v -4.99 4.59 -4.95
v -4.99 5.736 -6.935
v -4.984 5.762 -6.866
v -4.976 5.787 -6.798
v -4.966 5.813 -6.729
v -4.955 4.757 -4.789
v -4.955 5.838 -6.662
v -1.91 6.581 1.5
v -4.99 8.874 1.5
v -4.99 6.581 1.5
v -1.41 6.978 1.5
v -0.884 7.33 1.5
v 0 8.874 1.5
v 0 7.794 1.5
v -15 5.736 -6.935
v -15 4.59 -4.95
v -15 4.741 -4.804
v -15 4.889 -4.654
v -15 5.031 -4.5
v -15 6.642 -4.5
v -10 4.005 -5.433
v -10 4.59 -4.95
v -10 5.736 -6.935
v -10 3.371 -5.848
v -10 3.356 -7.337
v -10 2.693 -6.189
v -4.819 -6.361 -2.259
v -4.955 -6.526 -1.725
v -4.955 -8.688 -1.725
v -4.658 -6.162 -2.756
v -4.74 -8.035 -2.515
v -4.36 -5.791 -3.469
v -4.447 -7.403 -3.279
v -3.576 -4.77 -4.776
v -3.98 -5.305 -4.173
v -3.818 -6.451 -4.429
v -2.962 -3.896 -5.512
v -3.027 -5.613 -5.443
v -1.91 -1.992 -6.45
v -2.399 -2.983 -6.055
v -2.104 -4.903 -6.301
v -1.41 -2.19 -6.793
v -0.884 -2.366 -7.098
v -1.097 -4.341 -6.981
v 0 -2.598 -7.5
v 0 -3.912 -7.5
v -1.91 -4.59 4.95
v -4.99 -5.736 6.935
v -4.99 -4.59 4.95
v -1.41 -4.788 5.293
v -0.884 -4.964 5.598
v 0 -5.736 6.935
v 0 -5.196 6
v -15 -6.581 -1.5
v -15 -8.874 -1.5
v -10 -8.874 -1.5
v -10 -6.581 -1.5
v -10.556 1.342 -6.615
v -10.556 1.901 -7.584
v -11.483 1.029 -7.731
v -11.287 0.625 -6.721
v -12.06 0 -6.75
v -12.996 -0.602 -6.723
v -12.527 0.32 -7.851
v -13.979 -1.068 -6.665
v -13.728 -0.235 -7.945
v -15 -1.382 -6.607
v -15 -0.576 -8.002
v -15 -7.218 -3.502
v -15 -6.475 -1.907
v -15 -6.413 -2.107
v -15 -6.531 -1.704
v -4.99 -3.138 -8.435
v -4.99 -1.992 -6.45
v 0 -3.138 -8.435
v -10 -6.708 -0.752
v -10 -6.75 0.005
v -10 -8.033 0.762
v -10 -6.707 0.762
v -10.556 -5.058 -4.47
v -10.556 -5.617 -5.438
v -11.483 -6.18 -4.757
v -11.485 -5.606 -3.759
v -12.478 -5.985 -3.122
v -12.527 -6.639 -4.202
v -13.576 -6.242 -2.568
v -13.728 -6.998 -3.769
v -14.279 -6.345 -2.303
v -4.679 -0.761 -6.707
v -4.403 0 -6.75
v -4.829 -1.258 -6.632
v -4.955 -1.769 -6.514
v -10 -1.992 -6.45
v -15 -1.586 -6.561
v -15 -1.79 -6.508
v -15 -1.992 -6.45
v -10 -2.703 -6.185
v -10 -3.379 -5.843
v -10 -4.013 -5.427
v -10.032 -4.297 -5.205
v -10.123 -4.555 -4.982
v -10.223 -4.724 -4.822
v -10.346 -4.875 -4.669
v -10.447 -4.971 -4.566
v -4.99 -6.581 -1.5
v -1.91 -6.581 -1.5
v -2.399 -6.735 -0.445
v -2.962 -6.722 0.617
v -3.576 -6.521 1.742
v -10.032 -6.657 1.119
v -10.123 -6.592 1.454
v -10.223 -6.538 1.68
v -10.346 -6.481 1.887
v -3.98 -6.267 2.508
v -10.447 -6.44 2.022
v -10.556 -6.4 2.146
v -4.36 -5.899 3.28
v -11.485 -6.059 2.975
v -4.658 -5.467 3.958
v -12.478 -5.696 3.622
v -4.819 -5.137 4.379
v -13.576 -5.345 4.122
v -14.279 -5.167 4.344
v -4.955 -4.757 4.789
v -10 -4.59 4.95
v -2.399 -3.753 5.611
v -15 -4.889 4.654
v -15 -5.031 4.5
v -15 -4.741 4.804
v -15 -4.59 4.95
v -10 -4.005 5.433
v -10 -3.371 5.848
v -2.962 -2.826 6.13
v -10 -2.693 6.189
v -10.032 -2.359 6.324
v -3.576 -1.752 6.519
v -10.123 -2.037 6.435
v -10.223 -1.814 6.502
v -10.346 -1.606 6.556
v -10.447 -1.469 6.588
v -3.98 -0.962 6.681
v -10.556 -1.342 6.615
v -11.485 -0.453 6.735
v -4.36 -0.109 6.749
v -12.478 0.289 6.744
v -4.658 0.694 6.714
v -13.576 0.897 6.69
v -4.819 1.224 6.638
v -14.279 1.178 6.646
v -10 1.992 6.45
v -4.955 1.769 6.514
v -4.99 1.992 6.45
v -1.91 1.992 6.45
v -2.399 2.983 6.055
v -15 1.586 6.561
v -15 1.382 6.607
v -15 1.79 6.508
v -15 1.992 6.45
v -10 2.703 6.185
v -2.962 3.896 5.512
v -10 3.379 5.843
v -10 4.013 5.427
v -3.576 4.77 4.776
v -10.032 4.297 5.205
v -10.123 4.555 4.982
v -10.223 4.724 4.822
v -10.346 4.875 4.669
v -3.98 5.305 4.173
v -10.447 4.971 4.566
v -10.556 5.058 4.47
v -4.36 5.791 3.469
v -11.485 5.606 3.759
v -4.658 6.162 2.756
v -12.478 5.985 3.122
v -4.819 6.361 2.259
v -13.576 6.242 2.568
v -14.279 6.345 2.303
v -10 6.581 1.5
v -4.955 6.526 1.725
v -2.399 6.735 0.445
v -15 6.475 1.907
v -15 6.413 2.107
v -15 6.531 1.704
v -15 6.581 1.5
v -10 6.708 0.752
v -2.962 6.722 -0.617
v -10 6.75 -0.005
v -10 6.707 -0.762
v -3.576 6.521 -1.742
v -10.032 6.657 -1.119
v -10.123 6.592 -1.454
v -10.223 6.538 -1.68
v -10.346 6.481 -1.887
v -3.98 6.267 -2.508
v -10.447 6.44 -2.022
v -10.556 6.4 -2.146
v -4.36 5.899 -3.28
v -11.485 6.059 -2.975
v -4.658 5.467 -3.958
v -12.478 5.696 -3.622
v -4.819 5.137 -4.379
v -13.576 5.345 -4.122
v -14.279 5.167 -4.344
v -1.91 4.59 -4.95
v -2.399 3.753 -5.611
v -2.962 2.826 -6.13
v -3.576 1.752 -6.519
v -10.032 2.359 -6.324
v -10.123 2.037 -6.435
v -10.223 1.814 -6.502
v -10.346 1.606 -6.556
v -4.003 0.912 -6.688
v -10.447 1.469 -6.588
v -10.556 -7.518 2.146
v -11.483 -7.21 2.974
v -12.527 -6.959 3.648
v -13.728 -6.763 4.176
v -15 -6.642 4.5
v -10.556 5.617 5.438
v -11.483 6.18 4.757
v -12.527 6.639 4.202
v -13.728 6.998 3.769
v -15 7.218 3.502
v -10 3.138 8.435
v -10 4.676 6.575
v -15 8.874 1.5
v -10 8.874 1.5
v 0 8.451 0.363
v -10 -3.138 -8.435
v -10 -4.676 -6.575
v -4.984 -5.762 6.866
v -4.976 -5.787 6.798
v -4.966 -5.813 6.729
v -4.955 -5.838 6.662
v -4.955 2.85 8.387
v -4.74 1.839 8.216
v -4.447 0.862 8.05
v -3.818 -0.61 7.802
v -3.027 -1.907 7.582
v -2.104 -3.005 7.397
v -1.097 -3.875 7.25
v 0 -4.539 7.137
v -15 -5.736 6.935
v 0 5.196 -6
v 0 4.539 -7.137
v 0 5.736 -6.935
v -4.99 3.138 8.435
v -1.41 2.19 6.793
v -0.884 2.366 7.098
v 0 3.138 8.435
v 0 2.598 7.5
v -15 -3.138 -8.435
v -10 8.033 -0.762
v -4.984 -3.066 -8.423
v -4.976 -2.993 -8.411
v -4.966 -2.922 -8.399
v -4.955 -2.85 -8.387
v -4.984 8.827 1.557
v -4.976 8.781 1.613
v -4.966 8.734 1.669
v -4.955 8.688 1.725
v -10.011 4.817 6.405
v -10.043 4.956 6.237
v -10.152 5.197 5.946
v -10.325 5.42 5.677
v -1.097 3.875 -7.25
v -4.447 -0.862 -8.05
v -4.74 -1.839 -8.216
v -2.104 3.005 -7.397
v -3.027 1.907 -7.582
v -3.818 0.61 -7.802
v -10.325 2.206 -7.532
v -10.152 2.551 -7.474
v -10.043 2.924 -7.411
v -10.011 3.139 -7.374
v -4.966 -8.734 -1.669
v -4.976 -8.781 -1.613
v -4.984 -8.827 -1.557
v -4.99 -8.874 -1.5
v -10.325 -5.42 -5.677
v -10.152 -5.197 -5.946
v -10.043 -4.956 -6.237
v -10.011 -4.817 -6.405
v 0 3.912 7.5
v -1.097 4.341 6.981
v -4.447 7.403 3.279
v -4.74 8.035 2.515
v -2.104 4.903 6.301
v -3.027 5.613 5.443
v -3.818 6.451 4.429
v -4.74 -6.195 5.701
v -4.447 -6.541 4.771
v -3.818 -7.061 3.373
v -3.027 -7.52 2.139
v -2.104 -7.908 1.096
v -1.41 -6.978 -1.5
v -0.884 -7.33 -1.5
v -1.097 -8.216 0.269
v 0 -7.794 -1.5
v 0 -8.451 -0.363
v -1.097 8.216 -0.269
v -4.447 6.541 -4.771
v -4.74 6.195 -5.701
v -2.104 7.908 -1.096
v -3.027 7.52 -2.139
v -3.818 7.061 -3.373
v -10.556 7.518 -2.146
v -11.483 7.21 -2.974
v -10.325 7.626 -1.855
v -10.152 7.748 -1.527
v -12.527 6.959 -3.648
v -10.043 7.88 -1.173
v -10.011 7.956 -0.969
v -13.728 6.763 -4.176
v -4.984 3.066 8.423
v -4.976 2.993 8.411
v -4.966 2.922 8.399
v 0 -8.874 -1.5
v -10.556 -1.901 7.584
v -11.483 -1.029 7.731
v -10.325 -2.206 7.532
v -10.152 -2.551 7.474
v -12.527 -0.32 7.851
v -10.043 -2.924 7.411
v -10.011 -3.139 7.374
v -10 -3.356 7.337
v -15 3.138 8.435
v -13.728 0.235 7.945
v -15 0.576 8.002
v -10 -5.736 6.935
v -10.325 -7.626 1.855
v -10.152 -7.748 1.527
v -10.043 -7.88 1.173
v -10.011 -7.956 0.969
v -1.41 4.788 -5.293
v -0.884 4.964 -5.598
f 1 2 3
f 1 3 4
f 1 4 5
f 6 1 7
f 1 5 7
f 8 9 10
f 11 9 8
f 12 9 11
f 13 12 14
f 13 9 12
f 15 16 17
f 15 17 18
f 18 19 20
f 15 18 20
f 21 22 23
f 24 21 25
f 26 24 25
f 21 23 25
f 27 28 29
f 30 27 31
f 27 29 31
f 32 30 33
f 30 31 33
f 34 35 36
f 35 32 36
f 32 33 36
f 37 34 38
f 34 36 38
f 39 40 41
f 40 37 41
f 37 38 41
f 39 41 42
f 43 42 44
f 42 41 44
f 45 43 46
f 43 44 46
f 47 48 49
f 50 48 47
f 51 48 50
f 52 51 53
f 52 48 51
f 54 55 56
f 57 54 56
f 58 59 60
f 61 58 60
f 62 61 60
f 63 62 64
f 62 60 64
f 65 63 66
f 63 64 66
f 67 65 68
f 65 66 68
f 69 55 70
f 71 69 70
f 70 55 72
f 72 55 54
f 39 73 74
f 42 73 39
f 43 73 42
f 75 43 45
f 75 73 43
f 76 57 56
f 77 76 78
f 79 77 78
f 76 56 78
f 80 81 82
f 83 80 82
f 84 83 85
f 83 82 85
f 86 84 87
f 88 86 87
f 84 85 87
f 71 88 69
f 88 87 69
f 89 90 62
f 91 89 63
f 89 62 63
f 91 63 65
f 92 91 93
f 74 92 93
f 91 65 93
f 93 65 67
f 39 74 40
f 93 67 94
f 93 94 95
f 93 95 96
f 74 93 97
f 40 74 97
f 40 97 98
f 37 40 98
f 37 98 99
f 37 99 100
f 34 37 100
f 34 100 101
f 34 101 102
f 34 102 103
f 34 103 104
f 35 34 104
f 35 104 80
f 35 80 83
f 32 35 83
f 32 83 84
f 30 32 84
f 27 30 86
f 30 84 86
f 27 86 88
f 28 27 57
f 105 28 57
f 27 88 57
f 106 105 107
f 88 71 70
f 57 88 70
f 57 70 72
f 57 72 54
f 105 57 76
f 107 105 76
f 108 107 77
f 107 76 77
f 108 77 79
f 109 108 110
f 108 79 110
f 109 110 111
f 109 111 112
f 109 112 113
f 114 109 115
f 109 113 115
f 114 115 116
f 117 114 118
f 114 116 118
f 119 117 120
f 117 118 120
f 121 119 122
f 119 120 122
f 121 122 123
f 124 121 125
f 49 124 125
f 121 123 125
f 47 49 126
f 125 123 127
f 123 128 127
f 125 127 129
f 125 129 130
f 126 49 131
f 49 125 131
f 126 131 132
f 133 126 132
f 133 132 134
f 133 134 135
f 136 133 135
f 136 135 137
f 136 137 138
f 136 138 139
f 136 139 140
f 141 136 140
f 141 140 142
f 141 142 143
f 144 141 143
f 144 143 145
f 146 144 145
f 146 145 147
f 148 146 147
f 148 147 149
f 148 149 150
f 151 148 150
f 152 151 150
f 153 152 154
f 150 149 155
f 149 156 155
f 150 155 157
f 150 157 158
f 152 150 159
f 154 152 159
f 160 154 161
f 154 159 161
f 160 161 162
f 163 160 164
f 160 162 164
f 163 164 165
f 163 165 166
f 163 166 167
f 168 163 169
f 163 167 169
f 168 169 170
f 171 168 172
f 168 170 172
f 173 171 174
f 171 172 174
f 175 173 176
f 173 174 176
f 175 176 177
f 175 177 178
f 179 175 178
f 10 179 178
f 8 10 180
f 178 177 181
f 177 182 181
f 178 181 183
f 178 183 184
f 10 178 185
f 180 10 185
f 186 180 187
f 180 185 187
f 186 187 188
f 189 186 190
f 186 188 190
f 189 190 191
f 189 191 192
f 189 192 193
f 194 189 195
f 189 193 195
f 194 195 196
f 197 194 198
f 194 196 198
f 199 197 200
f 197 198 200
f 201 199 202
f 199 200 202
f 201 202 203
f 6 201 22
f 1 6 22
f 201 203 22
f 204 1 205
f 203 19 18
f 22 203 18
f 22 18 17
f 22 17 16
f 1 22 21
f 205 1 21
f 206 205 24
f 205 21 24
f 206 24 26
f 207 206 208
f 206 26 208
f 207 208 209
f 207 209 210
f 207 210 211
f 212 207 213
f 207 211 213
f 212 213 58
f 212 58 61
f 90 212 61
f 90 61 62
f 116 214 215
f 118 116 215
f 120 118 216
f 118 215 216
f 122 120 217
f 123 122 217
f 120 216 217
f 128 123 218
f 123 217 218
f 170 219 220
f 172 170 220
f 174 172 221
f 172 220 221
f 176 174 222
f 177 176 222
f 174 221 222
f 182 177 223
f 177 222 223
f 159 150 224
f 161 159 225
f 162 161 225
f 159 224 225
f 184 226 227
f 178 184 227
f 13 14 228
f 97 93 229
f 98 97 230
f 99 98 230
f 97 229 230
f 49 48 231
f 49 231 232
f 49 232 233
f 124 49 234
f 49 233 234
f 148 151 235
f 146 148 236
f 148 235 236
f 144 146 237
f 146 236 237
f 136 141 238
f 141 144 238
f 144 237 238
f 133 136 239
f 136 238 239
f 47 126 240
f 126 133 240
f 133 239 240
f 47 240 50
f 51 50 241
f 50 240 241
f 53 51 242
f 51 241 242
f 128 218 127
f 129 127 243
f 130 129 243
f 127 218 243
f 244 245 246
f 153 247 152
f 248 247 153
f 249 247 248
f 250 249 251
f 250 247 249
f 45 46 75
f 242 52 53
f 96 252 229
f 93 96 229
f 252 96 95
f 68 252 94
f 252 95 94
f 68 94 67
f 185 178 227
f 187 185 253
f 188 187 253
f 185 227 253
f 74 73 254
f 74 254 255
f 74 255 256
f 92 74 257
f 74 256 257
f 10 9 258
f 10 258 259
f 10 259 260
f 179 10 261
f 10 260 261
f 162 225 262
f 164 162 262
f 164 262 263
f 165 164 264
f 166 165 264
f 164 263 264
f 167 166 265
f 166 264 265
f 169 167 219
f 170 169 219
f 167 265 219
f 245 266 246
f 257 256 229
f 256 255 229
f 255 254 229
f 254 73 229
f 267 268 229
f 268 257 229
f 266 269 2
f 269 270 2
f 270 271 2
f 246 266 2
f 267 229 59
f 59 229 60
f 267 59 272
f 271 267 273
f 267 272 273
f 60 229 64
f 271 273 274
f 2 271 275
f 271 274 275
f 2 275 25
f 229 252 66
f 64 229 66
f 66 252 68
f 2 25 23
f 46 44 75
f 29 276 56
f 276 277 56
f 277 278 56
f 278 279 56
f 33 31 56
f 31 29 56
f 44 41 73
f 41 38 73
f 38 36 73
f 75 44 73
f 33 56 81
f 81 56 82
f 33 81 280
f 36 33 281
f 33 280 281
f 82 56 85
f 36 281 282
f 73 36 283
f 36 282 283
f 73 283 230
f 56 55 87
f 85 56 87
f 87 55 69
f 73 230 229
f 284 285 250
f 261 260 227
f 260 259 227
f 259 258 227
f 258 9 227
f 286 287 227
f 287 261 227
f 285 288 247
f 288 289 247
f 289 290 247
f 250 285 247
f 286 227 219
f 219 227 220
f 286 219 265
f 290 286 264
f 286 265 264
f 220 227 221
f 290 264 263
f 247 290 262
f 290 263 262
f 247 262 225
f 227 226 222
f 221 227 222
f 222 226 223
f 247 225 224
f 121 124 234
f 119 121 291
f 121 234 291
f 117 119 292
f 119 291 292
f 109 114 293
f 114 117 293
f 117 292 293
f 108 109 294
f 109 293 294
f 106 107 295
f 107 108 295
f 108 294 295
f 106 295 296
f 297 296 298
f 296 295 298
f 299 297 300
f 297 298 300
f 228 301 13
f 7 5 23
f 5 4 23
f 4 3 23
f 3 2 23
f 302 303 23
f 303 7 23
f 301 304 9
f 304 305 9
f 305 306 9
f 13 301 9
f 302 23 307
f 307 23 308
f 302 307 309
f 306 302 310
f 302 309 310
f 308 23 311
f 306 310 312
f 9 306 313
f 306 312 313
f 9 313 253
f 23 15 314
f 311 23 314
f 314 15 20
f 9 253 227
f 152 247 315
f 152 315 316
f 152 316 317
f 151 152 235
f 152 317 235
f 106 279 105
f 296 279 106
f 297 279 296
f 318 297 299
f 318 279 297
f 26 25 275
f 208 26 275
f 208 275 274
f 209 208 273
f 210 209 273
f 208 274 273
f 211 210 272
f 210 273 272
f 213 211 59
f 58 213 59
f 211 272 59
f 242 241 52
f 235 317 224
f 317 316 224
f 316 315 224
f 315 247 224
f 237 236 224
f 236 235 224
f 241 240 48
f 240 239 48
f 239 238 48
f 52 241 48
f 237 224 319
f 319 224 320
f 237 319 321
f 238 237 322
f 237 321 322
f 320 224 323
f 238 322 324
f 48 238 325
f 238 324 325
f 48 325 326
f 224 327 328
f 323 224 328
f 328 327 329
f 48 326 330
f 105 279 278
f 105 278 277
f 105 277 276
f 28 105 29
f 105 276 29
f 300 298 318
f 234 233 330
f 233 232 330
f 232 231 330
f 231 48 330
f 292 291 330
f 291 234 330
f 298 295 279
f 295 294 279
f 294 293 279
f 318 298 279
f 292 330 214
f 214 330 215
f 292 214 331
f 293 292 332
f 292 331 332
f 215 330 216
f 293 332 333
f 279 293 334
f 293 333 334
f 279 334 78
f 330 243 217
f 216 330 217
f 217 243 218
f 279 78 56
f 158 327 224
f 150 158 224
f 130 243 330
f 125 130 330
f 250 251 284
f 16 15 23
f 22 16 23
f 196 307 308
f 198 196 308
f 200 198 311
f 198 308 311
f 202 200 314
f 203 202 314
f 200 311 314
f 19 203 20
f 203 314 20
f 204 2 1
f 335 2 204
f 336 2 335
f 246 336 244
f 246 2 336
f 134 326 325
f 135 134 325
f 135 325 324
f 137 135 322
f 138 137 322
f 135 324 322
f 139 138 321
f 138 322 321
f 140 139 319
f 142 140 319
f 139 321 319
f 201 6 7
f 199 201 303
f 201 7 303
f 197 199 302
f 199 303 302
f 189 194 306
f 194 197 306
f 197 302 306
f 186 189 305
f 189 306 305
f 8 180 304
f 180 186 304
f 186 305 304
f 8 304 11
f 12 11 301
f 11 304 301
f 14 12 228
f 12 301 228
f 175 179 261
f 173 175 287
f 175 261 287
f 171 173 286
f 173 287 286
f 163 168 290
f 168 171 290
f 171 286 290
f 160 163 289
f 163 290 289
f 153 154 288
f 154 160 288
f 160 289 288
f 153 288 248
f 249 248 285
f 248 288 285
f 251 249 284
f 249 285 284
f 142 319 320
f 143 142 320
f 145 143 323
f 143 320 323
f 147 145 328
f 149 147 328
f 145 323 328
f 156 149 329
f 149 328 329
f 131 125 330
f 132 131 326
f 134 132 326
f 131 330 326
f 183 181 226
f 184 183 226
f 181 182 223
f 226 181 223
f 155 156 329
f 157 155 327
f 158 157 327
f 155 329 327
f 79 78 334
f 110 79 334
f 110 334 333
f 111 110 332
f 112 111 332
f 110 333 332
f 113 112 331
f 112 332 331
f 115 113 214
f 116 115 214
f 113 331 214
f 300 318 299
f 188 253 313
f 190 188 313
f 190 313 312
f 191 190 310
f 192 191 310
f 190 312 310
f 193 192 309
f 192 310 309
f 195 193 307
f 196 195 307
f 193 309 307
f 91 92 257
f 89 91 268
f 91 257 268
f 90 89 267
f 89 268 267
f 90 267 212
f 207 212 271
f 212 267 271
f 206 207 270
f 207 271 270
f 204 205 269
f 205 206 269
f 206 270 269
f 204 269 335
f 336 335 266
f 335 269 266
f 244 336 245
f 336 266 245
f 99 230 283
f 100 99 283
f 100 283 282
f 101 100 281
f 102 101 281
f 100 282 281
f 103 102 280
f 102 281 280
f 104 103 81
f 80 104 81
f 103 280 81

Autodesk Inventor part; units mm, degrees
sketch "Sketch1" plane through (0, 0, 0) normal (1, 0, 0) x (0, 1, 0)
  circle A0 centre (0, 0) radius 9
  dimension "d31" = 18
extrude "Extrusion1" add sketch "Sketch1" against normal blind 15
hole "Hole1" at (0, 0, 0) direction (-1, 0, 0) diameter 13.5 end through all
ref_plane "Work Plane1" through (0, 0, 1.5) normal (0, 0, 1) x (1, 0, 0)
ref_plane "Work Plane2" through (-5, -9, 1.5) normal (0, -1, 0) x (1, 0, 0)
sketch "Sketch4" plane through (-5, -9, 1.5) normal (0, -1, 0) x (1, 0, 0)
  line L0 (-10, -3) -> (-5, -3)
  line L1 (-10, 0) -> (-10, -6) construction
  line L2 (-40.0446, 0) -> (21.4016, 0) construction
  line L3 (-5, 0) -> (-5, 0.1987) construction
  arc A0 (-10, -6) -> (-5.0454, -0.225) centre (-12.8638, 1.4698) ccw construction
  arc A1 (-5.0454, -0.225) -> (-5, 0.1987) centre (-7, 0.1987) ccw construction
  line L4 (-10, -3) -> (-10, 3)
  line L5 (-5, -3) -> (-5, -0.7378)
  arc A2 (-5.5557, 0.6457) -> (-10, 3) centre (-11.3329, -4.8882) ccw
  arc A3 (-5, -0.7378) -> (-5.5557, 0.6457) centre (-7, -0.7378) ccw
  line L6 (-10, -8.25) -> (-10, 5.25) construction
  line L7 (-10, -8.25) -> (-10, 5.25) construction
  line L8 (-10, 7.5) -> (-10, -10.5) construction
  line L9 (-10, 7.5) -> (12.6236, 7.5)
  line L10 (-5, -1.5) -> (12.6236, -1.5)
  line L11 (-10, 7.5) -> (5, 7.5)
  line L12 (-2.5, 7.5) -> (-2.5, -13.092)
  line L13 (35.0446, 0) -> (-26.4016, 0) construction
  arc A4 (0.0454, -0.225) -> (5, -6) centre (7.8638, 1.4698) ccw construction
  arc A5 (0.0099, 0) -> (0.0454, -0.225) centre (2, 0.1987) ccw
  line L14 (5, 0.1987) -> (5, -10.5) construction
  line L15 (5, -6) -> (5, 0) construction
  line L16 (0.0099, 0) -> (5, 0) construction
  line L17 (-10, 3) -> (6.7233, 3)
  arc A6 (0.0099, -3) -> (0.0454, -3.225) centre (2, -2.8013) ccw
  arc A7 (0.0454, -3.225) -> (5, -9) centre (7.8638, -1.5302) ccw
  line L18 (5, -9) -> (5, -3)
  line L19 (0.0099, -3) -> (5, -3)
  line L20 (-10, -3) -> (-5, -3)
  line L21 (0.0099, -3) -> (12.6236, -3)
  point P0 (5, -1.5)
  point P1 (-4.9623, 0.2185)
  point P2 (-5, 0)
  point P3 (-4.9623, -0.2185)
  point P4 (-5, 0)
  point P5 (-0.0377, 0.2185)
  point P6 (0, 0)
  point P7 (-0.0377, -0.2185)
  point P8 (0, 0)
  point P9 (5, 0)
  dimension "d43" = 6
  dimension "d47" = 2
  dimension "d49" = 8
  dimension "d76" = 18
  dimension "d77" = 9
  dimension "d78" = 6
  dimension "d79" = 8
  dimension "d80" = 2
  dimension "d81" = 5
  dimension "d82" = 1.5
  dimension "d84" = 15
extrude "Extrusion7" cut sketch "Sketch4" against normal blind 10 contours L4 A2 A3 L5 L0 | L19 L18 A7 A6
pattern_circular "Circular Pattern3" count 6 over 360 about axis through (-10, 0, 0) along (1, 0, 0) of "Extrusion7"
ref_plane "Work Plane3" through (-7.5, 0, 0) normal (1, 0, 0) x (0, 0, -1)
sketch "Sketch6" plane through (-15, 0, 0) normal (-1, 0, 0) x (0, 0, 1)
  line L0 (-6.9352, 5.7361) -> (1.5, 8.8741)
  line L1 (6.9352, -5.7361) -> (4.9495, -4.5896) construction
  line L2 (4.5, -5.0312) -> (4.5, -7.7942) construction
  arc A0 (4.5, -7.7942) -> (6.9352, -5.7361) centre (0, 0) ccw construction
  line L3 (8.4352, 3.138) -> (6.4495, 1.9916) construction
  line L4 (6.6071, 1.3815) -> (9, 0) construction
  arc A1 (9, 0) -> (8.4352, 3.138) centre (0, 0) ccw construction
  line L5 (2.1071, 6.4127) -> (4.5, 7.7942) construction
  arc A2 (4.5, 7.7942) -> (1.5, 8.8741) centre (0, 0) ccw construction
  line L6 (1.5, 8.8741) -> (1.5, 6.5812) construction
  line L7 (-4.5, 5.0312) -> (-4.5, 7.7942) construction
  arc A3 (-4.5, 7.7942) -> (-6.9352, 5.7361) centre (0, 0) ccw construction
  line L8 (-6.9352, 5.7361) -> (-4.9495, 4.5896) construction
  line L9 (-6.6071, -1.3815) -> (-9, 0) construction
  arc A4 (-9, 0) -> (-8.4352, -3.138) centre (0, 0) ccw construction
  line L10 (-8.4352, -3.138) -> (-6.4495, -1.9916) construction
  line L11 (-2.1071, -6.4127) -> (-4.5, -7.7942) construction
  arc A5 (-4.5, -7.7942) -> (-1.5, -8.8741) centre (0, 0) ccw construction
  line L12 (-1.5, -8.8741) -> (-1.5, -6.5812) construction
  line L13 (0, 0) -> (-6.9352, 5.7361)
  line L14 (1.5, 8.8741) -> (0, 0)
  circle A6 centre (0, 0) radius 9
  line L15 (-8.4352, -3.138) -> (-6.9352, 5.7361)
  line L16 (0, 0) -> (-8.4352, -3.138)
  line L17 (-6.9352, 5.7361) -> (0, 0)
  line L18 (-1.5, -8.8741) -> (-8.4352, -3.138)
  line L19 (0, 0) -> (-1.5, -8.8741)
  line L20 (-8.4352, -3.138) -> (0, 0)
  line L21 (6.9352, -5.7361) -> (-1.5, -8.8741)
  line L22 (0, 0) -> (6.9352, -5.7361)
  line L23 (-1.5, -8.8741) -> (0, 0)
  line L24 (8.4352, 3.138) -> (6.9352, -5.7361)
  line L25 (0, 0) -> (8.4352, 3.138)
  line L26 (6.9352, -5.7361) -> (0, 0)
  line L27 (1.5, 8.8741) -> (8.4352, 3.138)
  line L28 (0, 0) -> (1.5, 8.8741)
  line L29 (8.4352, 3.138) -> (0, 0)
  arc A7 (-2.1071, -6.4127) -> (-1.5, -6.5812) centre (0, 0) ccw projected
  arc A8 (-6.6071, -1.3815) -> (-6.4495, -1.9916) centre (0, 0) ccw projected
  arc A9 (-4.5, 5.0312) -> (-4.9495, 4.5896) centre (0, 0) ccw projected
  arc A10 (2.1071, 6.4127) -> (1.5, 6.5812) centre (0, 0) ccw projected
  arc A11 (6.6071, 1.3815) -> (6.4495, 1.9916) centre (0, 0) ccw projected
  arc A12 (4.5, -5.0312) -> (4.9495, -4.5896) centre (0, 0) ccw projected
  dimension "d72" = 360
extrude "Extrusion11" cut sketch "Sketch6" against normal through all contours A6 L0 | L15 A6 | A6 L27 | L18 A6 | A6 L24 | L21 A6
properties part number "SPRING NUT1" material "Steel, Mild"
